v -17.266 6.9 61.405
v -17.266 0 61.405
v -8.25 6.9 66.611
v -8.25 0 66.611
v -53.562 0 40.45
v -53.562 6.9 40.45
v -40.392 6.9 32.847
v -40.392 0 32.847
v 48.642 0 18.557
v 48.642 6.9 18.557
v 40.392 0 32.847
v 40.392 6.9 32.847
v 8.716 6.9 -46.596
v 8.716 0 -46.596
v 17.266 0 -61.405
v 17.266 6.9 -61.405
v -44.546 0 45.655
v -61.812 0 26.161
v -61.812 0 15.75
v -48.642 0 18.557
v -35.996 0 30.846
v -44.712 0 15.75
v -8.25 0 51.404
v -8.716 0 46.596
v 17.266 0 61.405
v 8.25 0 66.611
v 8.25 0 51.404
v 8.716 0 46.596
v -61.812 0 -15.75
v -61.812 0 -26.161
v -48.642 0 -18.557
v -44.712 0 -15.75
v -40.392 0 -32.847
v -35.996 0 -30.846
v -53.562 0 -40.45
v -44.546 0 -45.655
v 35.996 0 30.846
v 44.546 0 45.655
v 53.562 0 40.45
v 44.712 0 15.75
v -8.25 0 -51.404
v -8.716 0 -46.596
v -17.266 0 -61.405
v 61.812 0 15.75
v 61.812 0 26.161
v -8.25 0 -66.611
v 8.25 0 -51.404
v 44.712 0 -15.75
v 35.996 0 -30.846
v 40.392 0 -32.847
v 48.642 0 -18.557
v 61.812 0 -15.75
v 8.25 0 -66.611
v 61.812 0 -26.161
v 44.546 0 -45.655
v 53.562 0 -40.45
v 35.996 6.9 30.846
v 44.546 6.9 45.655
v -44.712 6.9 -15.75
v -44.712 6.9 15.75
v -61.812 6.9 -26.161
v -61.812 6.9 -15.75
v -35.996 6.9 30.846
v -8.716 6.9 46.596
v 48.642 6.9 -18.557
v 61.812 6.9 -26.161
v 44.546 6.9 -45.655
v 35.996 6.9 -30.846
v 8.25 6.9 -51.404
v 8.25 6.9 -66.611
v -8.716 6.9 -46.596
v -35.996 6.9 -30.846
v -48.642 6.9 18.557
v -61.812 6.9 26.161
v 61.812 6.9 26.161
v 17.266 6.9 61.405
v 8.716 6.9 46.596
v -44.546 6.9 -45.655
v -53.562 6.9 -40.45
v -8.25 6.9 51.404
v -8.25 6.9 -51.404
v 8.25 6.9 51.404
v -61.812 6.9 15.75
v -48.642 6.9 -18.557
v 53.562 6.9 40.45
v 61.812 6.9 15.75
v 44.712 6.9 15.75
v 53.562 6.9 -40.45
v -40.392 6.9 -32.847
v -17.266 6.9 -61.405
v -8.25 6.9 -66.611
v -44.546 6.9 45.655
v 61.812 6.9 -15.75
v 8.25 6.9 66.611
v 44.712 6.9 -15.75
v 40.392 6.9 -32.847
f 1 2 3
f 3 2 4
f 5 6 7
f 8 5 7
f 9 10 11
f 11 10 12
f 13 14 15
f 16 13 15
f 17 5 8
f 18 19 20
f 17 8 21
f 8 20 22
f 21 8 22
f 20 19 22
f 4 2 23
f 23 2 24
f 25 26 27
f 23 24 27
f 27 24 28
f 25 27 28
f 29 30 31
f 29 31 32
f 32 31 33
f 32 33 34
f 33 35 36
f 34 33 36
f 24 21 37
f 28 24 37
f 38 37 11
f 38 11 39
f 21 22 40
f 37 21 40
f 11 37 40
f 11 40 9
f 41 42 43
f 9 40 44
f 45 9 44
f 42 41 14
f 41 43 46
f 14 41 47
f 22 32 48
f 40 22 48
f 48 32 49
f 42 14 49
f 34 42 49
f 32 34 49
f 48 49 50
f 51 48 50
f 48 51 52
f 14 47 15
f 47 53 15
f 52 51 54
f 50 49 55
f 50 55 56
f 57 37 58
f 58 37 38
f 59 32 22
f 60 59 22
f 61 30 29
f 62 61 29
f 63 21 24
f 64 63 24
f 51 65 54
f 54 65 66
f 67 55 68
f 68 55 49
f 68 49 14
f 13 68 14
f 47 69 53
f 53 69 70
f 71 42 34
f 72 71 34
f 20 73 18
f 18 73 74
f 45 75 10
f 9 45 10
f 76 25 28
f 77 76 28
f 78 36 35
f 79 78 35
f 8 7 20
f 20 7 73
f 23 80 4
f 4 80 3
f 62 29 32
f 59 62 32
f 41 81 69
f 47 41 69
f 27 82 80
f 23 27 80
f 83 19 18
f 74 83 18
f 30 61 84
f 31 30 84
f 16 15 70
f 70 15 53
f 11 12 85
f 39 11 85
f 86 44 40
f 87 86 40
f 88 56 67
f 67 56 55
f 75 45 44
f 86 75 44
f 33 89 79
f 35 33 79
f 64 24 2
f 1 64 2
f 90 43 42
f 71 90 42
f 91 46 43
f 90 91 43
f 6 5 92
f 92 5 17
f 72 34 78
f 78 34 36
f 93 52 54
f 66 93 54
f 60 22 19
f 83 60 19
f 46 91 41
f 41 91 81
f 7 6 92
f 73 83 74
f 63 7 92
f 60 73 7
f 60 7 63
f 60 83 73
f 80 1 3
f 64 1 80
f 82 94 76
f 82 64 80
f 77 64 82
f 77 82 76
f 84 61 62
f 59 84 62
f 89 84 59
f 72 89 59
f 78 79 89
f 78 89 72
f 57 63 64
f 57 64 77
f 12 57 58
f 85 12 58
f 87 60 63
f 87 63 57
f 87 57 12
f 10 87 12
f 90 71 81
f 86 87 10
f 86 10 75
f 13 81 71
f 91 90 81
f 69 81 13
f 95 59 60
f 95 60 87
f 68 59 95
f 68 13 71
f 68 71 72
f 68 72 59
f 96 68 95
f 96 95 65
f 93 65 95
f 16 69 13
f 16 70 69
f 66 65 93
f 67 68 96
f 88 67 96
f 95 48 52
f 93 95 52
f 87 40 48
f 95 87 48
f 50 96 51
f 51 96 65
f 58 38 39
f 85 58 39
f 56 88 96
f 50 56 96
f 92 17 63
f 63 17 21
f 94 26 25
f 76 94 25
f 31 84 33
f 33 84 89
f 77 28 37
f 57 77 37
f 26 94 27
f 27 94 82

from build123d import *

# Parameters (mm, degrees)
BOSS_EXTRUDE3_DEPTH = 6.9
CUT_EXTRUDE1_DEPTH  = 10


with BuildPart() as part:
    # Sketch10 → Boss-Extrude3 (new body)
    with BuildSketch(Plane(origin=(0, 0, 0), x_dir=(1, 0, 0), z_dir=(0, 1, 0))):
        Polygon((-44.545662223, 45.655350227), (-61.811524227, 35.686900152), (-61.811524227, 15.75), (-44.711524227, 15.75), (-44.711524227, -15.75), (-61.811524227, -15.75), (-61.811524227, -35.686900152), (-44.545662223, -45.655350227), (-35.995662223, -30.846315823), (-8.715862004, -46.596315823), (-17.265862004, -61.405350227), (0, -71.373800303), (17.265862004, -61.405350227), (8.715862004, -46.596315823), (35.995662223, -30.846315823), (44.545662223, -45.655350227), (61.811524227, -35.686900152), (61.811524227, -15.75), (44.711524227, -15.75), (44.711524227, 15.75), (61.811524227, 15.75), (61.811524227, 35.686900152), (44.545662223, 45.655350227), (35.995662223, 30.846315823), (8.715862004, 46.596315823), (17.265862004, 61.405350227), (0, 71.373800303), (-17.265862004, 61.405350227), (-8.715862004, 46.596315823), (-35.995662223, 30.846315823), align=None)
    extrude(amount=BOSS_EXTRUDE3_DEPTH)

    # Sketch11 → Cut-Extrude1 (cut)
    with BuildSketch(Plane(origin=(0, 6.9, 0), x_dir=(1, 0, 0), z_dir=(0, 1, 0))):
        Polygon((-40.392179181, 32.846714965), (-53.561524227, 40.450039872), (-61.811524227, 35.686900152), (-61.811524227, 26.16062071), (-48.642179181, 18.557295803), align=None)
        Polygon((0, 71.373800303), (-8.25, 66.610660582), (-8.25, 51.404010768), (8.25, 51.404010768), (8.25, 66.610660582), align=None)
        Polygon((61.811524227, 35.686900152), (53.561524227, 40.450039872), (40.392179181, 32.846714965), (48.642179181, 18.557295803), (61.811524227, 26.16062071), align=None)
        Polygon((61.811524227, -35.686900152), (61.811524227, -26.16062071), (48.642179181, -18.557295803), (40.392179181, -32.846714965), (53.561524227, -40.450039872), align=None)
        Polygon((-8.25, -51.404010768), (-8.25, -66.610660582), (0, -71.373800303), (8.25, -66.610660582), (8.25, -51.404010768), align=None)
        Polygon((-48.642179181, -18.557295803), (-61.811524227, -26.16062071), (-61.811524227, -35.686900152), (-53.561524227, -40.450039872), (-40.392179181, -32.846714965), align=None)
    extrude(amount=-CUT_EXTRUDE1_DEPTH, mode=Mode.SUBTRACT)


solid = part.part
